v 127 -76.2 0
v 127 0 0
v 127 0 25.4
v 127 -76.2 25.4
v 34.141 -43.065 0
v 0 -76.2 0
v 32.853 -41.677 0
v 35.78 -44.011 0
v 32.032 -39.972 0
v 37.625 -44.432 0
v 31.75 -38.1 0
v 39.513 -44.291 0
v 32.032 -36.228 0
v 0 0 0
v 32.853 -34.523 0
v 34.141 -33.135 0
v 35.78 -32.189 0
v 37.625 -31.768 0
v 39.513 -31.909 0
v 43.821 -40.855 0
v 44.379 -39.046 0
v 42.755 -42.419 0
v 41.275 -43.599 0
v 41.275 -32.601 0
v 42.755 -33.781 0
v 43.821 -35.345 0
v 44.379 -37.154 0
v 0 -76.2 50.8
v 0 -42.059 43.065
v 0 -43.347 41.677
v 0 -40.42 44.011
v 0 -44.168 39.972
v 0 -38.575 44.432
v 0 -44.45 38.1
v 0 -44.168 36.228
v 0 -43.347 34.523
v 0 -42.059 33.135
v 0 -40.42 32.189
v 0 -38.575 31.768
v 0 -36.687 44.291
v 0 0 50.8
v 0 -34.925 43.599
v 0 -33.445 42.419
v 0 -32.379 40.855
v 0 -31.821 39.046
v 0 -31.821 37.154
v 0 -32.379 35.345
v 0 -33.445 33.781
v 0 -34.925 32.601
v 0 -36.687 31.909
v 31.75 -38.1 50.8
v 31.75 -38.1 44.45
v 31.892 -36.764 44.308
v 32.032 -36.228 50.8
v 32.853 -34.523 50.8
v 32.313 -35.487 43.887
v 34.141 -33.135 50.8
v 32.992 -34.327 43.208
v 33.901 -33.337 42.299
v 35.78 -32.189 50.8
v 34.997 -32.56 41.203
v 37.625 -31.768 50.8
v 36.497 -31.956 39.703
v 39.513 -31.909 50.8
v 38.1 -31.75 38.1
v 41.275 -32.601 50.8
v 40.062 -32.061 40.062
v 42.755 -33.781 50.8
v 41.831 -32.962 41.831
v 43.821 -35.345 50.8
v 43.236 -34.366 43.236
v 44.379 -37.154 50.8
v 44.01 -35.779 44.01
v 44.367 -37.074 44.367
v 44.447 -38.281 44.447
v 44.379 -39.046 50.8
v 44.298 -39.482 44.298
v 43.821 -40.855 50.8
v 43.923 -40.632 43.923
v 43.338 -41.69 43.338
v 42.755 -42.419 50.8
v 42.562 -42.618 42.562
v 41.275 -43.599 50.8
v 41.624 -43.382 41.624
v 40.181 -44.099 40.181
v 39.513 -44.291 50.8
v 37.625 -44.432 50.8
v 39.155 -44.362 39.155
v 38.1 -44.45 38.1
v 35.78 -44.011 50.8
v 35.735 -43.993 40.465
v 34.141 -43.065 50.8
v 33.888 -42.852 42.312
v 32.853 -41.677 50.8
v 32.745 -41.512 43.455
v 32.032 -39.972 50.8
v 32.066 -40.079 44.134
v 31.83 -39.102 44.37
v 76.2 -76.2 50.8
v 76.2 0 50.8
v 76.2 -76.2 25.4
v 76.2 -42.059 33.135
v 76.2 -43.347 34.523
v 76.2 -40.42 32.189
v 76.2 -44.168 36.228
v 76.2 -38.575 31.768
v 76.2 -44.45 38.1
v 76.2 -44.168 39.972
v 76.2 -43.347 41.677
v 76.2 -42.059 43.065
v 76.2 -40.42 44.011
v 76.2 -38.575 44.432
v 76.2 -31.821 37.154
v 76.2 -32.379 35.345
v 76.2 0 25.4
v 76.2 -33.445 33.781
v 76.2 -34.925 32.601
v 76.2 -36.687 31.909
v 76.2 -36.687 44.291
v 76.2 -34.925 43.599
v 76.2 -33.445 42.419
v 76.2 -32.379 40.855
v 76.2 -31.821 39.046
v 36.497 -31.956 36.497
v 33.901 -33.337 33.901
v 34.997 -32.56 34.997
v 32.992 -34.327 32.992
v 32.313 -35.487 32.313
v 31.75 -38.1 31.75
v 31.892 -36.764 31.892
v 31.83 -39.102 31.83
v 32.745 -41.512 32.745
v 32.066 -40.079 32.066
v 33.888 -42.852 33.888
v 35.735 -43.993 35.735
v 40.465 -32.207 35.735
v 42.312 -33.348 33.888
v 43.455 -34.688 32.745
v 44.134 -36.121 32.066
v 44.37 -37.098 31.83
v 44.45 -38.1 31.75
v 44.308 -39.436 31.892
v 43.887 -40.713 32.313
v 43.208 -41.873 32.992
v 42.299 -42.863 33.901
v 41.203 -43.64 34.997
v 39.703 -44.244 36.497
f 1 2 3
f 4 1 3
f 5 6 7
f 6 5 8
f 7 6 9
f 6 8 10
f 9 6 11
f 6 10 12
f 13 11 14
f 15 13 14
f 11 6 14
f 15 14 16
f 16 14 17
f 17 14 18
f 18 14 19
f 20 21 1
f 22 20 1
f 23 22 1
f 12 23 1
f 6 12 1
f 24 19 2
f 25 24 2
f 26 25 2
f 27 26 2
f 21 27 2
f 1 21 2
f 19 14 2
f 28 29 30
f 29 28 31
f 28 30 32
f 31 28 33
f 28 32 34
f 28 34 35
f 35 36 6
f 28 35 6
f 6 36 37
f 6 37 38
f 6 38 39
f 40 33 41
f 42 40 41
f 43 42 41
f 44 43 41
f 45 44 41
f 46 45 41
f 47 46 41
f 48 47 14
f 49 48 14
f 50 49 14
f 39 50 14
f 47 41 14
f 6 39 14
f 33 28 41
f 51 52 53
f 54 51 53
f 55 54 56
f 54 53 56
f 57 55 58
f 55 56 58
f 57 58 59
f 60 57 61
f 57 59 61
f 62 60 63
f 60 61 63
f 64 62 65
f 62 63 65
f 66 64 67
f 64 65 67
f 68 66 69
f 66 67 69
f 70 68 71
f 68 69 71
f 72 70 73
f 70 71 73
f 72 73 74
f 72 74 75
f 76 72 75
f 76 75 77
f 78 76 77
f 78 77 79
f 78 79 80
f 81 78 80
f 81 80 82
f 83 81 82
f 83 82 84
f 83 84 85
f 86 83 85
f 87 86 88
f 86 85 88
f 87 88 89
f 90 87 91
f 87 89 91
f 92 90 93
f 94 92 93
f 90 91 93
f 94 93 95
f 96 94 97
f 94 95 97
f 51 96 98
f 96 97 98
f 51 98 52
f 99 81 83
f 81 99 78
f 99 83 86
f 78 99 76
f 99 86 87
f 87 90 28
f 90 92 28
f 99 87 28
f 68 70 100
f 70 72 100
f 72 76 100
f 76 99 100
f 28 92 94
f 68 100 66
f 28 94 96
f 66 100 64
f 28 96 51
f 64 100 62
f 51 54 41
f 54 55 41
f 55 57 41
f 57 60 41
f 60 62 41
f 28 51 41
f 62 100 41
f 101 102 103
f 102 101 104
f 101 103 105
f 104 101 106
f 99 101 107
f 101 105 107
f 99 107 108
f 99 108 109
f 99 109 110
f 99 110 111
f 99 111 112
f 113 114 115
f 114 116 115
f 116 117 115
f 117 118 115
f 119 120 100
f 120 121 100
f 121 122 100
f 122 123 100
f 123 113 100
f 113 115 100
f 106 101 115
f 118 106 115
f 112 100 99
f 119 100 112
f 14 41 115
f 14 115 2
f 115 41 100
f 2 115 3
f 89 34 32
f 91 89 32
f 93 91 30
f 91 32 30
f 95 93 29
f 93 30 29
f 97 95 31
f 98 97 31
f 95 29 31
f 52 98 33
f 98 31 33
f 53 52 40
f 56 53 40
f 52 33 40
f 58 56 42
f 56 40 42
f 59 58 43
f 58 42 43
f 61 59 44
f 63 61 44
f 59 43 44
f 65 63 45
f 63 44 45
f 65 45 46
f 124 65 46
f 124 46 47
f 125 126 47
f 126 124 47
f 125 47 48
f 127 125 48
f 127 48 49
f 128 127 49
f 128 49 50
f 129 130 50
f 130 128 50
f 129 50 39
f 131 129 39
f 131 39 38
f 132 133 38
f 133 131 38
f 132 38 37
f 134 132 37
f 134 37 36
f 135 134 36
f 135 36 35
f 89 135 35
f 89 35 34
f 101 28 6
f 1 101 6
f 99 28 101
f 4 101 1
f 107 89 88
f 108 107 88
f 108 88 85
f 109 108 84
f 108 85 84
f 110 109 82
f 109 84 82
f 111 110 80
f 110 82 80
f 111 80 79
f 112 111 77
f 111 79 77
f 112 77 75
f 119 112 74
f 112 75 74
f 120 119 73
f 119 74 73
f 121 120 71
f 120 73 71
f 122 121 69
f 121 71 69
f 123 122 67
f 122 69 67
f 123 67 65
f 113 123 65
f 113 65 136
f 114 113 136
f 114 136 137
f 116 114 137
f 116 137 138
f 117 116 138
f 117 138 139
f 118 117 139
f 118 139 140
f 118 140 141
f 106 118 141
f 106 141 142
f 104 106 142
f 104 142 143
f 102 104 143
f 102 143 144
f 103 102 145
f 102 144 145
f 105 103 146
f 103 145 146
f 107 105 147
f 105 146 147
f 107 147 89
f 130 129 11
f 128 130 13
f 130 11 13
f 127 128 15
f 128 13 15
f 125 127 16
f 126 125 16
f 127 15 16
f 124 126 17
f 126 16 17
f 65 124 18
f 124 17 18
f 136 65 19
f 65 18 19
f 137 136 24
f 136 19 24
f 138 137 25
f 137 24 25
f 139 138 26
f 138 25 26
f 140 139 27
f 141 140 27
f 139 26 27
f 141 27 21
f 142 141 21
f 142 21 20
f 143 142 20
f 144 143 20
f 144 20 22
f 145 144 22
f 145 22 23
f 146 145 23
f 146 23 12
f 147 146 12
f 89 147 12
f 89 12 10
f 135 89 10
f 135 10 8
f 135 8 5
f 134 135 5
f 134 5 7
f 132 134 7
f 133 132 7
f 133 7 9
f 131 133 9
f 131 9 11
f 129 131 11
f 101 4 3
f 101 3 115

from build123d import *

# Parameters (mm, degrees)
F1_DEPTH = 76.2
F4_D     = 12.7
F5_D     = 12.7


with BuildPart() as f1:
    # F0 (on Front) → F1 (new body)
    with BuildSketch(Plane.XZ):
        Polygon((0, 50.8), (0, 0), (127, 0), (127, 25.4), (76.2, 25.4), (76.2, 50.8), (55.7977, 50.8), align=None)
    extrude(amount=F1_DEPTH)

    # F4 (through all)
    with Locations(Plane.XY.offset(50.8)):
        with Locations((38.1, -38.1)):
            Hole(F4_D / 2)

    # F5 (through all)
    with Locations(Plane.YZ.offset(76.2)):
        with Locations((-38.1, 38.1)):
            Hole(F5_D / 2)


solid = f1.part
